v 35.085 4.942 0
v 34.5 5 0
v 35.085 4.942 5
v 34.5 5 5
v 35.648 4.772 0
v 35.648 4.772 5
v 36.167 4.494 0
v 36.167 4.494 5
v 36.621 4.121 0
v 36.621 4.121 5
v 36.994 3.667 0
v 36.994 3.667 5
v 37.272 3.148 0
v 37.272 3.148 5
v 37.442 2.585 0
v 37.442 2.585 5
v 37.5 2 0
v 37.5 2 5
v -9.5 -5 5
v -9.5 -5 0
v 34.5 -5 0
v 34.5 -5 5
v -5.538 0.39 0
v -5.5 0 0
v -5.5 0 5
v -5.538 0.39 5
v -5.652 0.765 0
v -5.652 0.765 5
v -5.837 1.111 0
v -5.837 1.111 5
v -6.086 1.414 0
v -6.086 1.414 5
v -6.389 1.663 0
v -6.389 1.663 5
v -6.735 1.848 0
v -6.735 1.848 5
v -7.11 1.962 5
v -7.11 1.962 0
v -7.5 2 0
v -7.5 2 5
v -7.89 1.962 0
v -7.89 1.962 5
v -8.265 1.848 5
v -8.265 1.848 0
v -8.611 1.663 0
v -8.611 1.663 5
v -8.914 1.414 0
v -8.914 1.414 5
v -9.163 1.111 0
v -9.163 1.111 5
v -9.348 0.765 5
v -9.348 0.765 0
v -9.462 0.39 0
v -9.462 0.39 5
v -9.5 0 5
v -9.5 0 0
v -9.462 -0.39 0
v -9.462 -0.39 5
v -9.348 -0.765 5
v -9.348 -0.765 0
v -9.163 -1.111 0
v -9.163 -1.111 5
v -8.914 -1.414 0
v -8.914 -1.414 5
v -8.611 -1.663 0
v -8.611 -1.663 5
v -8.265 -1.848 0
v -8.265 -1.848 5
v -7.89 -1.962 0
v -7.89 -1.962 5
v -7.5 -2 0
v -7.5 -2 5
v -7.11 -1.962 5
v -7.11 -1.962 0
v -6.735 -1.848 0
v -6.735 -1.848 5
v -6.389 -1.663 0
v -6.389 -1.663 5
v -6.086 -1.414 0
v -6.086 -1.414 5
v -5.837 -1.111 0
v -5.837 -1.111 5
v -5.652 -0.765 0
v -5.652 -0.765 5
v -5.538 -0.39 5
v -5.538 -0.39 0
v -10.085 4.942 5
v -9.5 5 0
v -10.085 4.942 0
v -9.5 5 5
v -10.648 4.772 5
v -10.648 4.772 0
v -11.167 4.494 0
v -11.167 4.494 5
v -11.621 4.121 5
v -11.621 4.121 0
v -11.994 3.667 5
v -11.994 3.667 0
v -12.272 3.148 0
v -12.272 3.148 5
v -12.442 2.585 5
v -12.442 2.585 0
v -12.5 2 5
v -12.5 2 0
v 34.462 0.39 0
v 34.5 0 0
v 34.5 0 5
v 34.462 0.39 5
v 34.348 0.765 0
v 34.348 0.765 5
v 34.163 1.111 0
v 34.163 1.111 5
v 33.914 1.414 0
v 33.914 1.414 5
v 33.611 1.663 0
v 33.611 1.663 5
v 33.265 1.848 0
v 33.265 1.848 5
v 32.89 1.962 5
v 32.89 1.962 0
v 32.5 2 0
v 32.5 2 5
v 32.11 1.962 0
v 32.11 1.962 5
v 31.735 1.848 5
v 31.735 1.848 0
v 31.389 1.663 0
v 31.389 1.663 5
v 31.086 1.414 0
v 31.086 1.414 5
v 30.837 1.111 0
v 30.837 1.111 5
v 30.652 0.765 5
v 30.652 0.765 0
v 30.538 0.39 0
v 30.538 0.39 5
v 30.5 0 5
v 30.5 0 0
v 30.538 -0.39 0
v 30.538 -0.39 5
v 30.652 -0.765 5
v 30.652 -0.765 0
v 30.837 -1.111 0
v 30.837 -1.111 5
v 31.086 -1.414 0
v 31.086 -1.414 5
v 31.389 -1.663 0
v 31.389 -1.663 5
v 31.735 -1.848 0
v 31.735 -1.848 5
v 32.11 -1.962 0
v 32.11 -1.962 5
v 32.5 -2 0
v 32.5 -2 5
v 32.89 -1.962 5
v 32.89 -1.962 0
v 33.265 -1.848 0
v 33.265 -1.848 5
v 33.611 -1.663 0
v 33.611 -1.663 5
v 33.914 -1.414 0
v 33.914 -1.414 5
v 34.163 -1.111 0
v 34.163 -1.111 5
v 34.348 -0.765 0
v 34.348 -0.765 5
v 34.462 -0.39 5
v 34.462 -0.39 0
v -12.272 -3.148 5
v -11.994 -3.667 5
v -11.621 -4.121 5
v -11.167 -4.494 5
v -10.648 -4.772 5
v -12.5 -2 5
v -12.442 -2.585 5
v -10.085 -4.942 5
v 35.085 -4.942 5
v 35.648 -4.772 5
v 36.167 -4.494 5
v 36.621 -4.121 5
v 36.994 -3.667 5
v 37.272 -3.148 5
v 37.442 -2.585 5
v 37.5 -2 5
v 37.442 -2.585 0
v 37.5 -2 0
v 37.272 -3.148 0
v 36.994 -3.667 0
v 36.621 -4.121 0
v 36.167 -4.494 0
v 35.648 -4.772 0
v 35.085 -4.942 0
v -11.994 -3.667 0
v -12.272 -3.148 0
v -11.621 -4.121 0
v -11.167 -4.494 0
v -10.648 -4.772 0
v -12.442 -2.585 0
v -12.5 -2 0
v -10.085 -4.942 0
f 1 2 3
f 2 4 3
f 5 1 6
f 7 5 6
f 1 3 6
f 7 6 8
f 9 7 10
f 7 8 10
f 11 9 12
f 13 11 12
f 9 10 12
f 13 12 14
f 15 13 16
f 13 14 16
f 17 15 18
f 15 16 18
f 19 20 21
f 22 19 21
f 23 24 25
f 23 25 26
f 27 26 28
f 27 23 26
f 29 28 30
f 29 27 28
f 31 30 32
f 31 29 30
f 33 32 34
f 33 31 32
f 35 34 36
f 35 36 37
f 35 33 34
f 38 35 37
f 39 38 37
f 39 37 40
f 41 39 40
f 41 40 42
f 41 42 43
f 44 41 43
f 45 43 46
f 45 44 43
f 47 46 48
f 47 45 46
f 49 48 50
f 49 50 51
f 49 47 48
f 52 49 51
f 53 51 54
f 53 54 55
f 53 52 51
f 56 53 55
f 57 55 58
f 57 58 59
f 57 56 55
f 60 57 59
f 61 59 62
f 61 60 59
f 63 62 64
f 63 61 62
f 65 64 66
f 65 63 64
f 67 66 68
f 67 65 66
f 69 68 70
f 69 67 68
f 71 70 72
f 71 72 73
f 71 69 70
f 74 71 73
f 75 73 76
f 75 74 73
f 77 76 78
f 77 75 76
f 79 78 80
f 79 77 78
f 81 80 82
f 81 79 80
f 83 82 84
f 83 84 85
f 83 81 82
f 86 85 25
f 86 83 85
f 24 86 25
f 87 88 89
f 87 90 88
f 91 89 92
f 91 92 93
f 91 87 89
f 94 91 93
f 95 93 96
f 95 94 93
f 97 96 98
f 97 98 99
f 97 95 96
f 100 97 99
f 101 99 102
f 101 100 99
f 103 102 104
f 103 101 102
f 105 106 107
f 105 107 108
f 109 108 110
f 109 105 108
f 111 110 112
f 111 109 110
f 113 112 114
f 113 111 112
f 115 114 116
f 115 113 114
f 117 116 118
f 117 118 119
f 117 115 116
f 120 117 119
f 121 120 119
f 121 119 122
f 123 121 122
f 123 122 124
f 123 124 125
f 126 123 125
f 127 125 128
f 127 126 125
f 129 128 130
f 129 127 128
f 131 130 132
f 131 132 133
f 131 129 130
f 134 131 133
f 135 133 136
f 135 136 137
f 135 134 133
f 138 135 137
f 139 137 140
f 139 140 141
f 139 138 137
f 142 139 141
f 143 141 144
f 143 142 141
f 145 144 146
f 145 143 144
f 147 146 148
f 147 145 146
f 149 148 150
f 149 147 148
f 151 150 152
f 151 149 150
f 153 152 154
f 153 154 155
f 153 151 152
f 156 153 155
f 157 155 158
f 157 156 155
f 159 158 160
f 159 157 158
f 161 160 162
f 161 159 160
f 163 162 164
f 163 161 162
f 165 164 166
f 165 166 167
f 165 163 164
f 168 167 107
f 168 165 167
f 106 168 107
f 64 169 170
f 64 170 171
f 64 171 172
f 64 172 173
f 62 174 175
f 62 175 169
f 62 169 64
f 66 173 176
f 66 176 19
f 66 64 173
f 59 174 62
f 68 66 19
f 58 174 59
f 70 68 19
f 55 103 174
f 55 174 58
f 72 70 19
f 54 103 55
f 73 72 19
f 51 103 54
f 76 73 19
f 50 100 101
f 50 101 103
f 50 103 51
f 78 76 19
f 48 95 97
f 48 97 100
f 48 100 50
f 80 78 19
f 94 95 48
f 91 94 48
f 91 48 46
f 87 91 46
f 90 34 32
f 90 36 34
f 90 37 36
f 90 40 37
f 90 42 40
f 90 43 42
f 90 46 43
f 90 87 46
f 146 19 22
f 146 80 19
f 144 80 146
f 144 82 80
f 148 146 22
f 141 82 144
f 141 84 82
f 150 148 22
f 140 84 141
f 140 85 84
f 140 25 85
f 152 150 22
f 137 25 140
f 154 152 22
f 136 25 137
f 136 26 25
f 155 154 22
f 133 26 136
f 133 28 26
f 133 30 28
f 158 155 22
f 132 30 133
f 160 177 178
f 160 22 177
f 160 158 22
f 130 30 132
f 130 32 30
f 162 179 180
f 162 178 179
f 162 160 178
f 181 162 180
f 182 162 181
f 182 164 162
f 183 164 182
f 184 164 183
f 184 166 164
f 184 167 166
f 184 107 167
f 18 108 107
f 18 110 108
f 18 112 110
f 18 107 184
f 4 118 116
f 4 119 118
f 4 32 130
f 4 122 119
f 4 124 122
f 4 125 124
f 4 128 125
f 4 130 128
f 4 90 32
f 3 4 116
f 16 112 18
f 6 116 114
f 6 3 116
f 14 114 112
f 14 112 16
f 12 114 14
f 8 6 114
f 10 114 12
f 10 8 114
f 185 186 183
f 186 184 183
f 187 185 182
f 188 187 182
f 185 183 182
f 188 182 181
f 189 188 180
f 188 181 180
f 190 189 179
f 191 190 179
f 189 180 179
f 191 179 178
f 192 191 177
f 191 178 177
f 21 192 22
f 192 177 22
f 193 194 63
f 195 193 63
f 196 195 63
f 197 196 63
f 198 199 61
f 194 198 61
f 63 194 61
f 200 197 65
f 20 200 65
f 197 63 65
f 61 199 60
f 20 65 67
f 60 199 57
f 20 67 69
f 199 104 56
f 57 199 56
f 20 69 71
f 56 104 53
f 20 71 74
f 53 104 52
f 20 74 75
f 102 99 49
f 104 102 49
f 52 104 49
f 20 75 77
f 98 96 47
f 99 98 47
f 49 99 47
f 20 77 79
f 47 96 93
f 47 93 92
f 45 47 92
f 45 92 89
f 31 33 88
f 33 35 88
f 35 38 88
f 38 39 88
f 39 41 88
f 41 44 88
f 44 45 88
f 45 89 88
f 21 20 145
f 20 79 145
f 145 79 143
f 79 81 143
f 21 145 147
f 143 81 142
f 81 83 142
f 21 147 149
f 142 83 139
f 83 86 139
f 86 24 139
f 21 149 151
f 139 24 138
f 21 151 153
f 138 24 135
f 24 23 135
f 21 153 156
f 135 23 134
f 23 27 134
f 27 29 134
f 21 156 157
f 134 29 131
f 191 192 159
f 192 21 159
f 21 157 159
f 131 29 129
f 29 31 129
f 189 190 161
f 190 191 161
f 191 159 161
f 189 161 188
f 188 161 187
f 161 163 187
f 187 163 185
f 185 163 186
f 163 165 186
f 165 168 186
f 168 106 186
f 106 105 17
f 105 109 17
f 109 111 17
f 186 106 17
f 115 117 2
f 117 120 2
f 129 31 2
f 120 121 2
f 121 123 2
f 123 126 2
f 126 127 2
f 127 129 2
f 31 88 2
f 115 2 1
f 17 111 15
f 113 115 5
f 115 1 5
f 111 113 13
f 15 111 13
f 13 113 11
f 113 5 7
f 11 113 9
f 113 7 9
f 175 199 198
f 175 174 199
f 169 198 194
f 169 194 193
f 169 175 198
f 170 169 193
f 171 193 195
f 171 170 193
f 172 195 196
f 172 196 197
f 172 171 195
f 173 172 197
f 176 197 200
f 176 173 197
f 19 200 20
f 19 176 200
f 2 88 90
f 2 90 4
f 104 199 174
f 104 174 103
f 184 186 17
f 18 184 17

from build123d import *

# Parameters (mm, degrees)
ESQUISSE1_W        = 25
ESQUISSE1_H        = 10
ESQUISSE1_R        = 2
BOSS_EXTRU_1_DEPTH = 5
CONG_1_R           = 3
CONG_2_R           = 3
CONG_3_R           = 3
CONG_4_R           = 3


with BuildPart() as part:
    # Esquisse1 → Boss.-Extru.1 (new body)
    # profile 1 of 2: a face of its own
    with BuildSketch(Plane.XY):
        Rectangle(ESQUISSE1_W, ESQUISSE1_H)
        with Locations((-7.5, 0)):
            Circle(ESQUISSE1_R, mode=Mode.SUBTRACT)
    # profile 2 of 2: a face of its own
    with BuildSketch(Plane.XY):
        with Locations((25, 0)):
            Rectangle(ESQUISSE1_W, ESQUISSE1_H)
        with Locations((32.5, 0)):
            Circle(ESQUISSE1_R, mode=Mode.SUBTRACT)
    extrude(amount=BOSS_EXTRU_1_DEPTH)

    # Congé1
    cong_1_edges = [part.edges().sort_by_distance(p)[0] for p in [
        (37.5, 5, 2.5),
    ]]
    fillet(cong_1_edges, radius=CONG_1_R)

    # Congé2
    cong_2_edges = [part.edges().sort_by_distance(p)[0] for p in [
        (37.5, -5, 2.5),
    ]]
    fillet(cong_2_edges, radius=CONG_2_R)

    # Congé3
    cong_3_edges = [part.edges().sort_by_distance(p)[0] for p in [
        (-12.5, 5, 2.5),
    ]]
    fillet(cong_3_edges, radius=CONG_3_R)

    # Congé4
    cong_4_edges = [part.edges().sort_by_distance(p)[0] for p in [
        (-12.5, -5, 2.5),
    ]]
    fillet(cong_4_edges, radius=CONG_4_R)


solid = part.part
